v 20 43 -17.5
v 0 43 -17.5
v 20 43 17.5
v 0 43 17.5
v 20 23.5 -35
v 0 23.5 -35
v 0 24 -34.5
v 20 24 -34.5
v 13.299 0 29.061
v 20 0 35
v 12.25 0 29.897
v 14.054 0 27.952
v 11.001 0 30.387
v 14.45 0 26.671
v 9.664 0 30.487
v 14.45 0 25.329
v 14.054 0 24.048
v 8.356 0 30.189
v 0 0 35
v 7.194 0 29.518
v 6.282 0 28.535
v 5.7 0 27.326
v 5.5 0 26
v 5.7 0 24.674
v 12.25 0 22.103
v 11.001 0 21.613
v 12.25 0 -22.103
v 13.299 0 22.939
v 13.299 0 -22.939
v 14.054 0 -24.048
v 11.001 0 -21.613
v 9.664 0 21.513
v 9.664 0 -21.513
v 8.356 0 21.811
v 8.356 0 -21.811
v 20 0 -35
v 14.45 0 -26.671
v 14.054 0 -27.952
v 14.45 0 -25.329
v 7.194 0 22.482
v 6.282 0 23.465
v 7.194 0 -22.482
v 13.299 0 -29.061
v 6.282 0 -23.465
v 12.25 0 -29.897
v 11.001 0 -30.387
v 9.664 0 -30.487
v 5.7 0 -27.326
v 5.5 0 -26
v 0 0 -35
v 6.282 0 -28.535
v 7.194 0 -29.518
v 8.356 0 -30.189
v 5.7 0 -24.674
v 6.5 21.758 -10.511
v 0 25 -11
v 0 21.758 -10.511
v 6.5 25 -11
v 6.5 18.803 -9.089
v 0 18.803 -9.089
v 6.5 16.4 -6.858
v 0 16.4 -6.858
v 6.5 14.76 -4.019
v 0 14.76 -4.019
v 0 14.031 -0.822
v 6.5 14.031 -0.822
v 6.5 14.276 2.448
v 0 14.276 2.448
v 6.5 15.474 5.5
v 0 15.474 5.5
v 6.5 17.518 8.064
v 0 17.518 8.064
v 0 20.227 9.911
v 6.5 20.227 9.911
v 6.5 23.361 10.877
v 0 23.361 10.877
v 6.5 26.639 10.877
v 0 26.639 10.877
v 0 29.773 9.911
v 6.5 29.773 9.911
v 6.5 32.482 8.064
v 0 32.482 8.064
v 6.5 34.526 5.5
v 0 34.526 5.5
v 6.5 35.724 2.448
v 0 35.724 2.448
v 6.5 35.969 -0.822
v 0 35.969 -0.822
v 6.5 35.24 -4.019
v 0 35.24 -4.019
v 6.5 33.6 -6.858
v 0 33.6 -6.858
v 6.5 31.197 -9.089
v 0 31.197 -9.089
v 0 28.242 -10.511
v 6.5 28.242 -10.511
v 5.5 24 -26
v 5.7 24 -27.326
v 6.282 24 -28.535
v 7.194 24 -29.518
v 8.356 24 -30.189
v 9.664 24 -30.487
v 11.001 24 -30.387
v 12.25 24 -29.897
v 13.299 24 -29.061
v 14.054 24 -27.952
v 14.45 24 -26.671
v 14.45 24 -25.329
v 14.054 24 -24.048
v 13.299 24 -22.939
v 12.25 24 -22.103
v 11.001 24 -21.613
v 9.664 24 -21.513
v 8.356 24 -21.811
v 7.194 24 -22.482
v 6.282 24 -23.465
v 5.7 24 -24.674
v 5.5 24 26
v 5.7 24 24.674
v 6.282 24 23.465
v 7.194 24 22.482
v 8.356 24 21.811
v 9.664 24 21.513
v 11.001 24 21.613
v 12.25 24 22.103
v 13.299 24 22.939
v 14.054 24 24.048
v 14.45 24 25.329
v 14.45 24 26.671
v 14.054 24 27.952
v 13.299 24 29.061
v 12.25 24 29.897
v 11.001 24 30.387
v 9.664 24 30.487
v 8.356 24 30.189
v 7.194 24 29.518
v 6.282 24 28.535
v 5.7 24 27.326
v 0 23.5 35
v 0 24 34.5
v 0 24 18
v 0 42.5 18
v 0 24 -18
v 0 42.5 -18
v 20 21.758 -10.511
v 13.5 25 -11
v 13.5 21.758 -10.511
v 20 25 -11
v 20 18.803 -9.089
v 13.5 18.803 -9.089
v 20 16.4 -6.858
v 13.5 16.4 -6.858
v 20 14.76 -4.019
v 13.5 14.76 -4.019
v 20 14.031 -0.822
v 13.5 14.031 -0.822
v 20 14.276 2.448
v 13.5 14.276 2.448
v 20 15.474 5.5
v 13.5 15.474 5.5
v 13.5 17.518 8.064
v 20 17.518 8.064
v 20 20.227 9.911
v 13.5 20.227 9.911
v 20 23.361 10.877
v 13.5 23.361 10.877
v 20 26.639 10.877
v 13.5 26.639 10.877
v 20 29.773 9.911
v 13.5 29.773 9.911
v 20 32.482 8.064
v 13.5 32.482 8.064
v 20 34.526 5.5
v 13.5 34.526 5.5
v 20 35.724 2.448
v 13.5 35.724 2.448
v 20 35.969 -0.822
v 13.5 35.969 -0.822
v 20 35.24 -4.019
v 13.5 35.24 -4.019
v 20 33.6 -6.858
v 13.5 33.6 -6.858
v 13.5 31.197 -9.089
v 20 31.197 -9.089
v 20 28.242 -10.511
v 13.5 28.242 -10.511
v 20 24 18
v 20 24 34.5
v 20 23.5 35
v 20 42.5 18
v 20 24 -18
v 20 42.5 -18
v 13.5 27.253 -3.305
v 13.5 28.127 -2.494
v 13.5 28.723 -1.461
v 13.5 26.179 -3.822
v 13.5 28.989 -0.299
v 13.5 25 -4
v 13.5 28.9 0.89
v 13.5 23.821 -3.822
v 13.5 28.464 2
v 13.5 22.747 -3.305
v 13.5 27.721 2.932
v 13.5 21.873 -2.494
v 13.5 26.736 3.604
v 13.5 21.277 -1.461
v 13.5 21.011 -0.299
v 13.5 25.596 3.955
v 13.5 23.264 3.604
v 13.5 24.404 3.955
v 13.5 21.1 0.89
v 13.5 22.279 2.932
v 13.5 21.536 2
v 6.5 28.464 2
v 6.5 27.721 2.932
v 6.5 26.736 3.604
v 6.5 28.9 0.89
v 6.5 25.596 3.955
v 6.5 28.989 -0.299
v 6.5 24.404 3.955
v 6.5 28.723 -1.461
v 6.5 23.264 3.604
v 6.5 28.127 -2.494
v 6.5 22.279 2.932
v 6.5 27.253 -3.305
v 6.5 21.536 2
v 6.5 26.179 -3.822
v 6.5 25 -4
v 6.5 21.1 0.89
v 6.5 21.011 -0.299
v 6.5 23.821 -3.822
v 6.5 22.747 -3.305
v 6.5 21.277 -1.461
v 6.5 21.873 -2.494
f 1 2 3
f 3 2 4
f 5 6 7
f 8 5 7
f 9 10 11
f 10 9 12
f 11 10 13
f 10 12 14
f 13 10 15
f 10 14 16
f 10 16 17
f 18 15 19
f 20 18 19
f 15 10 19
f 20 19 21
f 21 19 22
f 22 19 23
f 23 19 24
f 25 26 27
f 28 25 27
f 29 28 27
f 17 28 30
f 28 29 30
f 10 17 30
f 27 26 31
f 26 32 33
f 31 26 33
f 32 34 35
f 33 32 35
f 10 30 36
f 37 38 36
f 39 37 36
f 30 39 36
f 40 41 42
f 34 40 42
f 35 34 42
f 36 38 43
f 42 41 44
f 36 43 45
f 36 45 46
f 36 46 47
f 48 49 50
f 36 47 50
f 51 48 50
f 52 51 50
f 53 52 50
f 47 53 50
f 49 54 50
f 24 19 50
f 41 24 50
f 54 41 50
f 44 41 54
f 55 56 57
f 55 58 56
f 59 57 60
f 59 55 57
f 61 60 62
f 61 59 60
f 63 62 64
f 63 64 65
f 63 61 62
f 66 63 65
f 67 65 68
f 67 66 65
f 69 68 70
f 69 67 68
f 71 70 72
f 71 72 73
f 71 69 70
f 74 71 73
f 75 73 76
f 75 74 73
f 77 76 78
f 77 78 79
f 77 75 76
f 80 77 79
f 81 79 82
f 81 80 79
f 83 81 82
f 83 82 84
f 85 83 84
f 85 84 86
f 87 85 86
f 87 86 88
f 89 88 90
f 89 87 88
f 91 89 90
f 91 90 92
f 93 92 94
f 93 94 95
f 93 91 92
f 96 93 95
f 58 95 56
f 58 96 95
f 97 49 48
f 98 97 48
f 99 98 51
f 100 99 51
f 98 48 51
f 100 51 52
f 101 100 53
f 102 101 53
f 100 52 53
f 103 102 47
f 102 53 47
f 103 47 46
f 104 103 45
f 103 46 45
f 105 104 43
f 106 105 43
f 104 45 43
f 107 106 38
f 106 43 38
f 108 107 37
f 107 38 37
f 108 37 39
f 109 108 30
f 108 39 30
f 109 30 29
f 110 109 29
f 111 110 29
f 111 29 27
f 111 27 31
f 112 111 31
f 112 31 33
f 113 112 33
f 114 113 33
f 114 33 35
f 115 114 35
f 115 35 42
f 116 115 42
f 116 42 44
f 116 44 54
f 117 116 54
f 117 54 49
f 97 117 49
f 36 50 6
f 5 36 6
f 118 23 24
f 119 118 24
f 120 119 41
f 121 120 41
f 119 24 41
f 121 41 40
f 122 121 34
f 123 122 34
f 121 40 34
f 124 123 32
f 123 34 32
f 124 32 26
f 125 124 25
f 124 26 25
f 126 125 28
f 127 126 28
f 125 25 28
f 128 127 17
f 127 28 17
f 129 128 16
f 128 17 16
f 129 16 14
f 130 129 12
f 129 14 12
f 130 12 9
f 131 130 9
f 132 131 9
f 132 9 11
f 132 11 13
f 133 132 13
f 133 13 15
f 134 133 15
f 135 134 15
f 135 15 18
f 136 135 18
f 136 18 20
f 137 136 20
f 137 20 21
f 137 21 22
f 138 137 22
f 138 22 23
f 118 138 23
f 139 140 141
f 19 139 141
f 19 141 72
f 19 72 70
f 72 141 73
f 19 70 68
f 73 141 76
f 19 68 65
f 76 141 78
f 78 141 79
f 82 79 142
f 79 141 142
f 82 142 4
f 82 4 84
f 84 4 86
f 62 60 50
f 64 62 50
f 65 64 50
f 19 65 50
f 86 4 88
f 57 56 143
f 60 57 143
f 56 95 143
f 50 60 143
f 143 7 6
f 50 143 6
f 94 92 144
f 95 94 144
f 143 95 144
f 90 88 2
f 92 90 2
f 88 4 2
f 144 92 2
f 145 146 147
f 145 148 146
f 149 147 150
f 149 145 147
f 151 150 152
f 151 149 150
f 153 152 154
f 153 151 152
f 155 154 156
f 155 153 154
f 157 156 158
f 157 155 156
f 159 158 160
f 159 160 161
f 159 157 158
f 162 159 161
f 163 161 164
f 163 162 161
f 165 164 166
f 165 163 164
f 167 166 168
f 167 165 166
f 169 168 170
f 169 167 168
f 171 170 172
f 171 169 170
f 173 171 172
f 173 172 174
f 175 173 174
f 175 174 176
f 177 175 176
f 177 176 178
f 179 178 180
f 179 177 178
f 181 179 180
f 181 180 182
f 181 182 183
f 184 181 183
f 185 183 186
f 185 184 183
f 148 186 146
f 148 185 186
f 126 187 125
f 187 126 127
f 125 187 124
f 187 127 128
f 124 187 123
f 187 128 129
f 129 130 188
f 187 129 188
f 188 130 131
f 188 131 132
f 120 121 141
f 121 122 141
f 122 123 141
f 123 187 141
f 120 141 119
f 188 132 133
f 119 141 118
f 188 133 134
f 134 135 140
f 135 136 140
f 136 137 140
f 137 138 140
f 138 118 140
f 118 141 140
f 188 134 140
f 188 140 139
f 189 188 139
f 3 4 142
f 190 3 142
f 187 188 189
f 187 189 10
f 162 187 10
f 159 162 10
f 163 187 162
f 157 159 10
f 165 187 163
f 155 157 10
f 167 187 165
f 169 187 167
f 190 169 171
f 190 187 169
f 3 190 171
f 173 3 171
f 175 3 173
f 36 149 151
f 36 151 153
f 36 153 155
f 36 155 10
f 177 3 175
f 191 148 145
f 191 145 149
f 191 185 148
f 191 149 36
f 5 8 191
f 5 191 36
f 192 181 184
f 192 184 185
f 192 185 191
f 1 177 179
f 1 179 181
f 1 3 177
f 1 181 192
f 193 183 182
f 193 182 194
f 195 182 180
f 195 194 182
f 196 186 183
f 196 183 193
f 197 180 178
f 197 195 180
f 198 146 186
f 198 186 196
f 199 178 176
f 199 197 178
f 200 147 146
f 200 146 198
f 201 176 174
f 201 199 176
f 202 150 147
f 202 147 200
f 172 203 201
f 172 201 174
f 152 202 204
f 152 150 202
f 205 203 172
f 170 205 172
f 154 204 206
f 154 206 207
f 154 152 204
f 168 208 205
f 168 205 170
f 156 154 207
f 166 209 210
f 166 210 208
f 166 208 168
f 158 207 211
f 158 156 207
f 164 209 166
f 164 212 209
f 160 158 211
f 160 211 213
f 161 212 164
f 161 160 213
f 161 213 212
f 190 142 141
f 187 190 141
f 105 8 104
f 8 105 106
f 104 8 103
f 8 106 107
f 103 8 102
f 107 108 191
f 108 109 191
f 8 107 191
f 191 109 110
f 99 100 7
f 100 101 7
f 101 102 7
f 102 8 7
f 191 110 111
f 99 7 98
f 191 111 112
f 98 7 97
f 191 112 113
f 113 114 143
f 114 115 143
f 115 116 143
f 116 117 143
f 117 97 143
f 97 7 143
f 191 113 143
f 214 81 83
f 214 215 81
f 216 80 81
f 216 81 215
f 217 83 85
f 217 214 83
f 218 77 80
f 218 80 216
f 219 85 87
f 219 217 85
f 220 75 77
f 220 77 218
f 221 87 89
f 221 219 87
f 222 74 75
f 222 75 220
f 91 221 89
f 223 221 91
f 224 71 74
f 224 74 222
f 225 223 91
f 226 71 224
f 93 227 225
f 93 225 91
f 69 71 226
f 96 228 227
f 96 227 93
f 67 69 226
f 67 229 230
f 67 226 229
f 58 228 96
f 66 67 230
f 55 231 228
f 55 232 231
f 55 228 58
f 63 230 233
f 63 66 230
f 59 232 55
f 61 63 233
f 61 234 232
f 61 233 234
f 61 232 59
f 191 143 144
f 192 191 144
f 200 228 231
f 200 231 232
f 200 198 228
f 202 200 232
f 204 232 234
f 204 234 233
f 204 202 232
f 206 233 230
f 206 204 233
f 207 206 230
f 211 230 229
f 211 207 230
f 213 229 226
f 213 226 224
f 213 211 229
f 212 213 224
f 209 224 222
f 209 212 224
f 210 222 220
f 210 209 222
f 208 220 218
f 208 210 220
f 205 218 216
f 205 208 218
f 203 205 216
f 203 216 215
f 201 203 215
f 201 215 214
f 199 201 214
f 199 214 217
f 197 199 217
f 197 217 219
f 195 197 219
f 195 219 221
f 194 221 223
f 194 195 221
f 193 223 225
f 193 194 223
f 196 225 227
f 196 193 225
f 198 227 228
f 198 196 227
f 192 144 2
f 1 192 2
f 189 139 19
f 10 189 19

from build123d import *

# Parameters (mm, degrees)
BOSS_EXTRUDE1_DEPTH = 20
DIAMETERHOLE1_D     = 9


with BuildPart() as part:
    # Sketch1 → Boss-Extrude1 (new body)
    with BuildSketch(Plane(origin=(0, 0, 0), x_dir=(0, 0, -1), z_dir=(1, 0, 0))):
        Polygon((-18, 42.5), (-18, 24), (-34.5, 24), (-35, 23.5), (-35, 0), (35, 0), (35, 23.5), (34.5, 24), (18, 24), (18, 42.5), (17.5, 43), (-17.5, 43), align=None)
    extrude(amount=BOSS_EXTRUDE1_DEPTH)

    # Sketch4 → Cut-Revolve1 (revolve, cut)
    with BuildSketch(Plane.XY):
        Polygon((0, 36), (6.5, 36), (6.5, 29), (13.5, 29), (13.5, 36), (20, 36), (20, 25), (0, 25), align=None)
    revolve(axis=Axis((20, 25, 0), (-1, 0, 0)), mode=Mode.SUBTRACT)

    # DiameterHole1 (through all)
    with Locations(Plane(origin=(0, 24, 0), x_dir=(1, 0, 0), z_dir=(0, 1, 0))):
        with Locations((10, -26), (10, 26)):
            Hole(DIAMETERHOLE1_D / 2)


solid = part.part
